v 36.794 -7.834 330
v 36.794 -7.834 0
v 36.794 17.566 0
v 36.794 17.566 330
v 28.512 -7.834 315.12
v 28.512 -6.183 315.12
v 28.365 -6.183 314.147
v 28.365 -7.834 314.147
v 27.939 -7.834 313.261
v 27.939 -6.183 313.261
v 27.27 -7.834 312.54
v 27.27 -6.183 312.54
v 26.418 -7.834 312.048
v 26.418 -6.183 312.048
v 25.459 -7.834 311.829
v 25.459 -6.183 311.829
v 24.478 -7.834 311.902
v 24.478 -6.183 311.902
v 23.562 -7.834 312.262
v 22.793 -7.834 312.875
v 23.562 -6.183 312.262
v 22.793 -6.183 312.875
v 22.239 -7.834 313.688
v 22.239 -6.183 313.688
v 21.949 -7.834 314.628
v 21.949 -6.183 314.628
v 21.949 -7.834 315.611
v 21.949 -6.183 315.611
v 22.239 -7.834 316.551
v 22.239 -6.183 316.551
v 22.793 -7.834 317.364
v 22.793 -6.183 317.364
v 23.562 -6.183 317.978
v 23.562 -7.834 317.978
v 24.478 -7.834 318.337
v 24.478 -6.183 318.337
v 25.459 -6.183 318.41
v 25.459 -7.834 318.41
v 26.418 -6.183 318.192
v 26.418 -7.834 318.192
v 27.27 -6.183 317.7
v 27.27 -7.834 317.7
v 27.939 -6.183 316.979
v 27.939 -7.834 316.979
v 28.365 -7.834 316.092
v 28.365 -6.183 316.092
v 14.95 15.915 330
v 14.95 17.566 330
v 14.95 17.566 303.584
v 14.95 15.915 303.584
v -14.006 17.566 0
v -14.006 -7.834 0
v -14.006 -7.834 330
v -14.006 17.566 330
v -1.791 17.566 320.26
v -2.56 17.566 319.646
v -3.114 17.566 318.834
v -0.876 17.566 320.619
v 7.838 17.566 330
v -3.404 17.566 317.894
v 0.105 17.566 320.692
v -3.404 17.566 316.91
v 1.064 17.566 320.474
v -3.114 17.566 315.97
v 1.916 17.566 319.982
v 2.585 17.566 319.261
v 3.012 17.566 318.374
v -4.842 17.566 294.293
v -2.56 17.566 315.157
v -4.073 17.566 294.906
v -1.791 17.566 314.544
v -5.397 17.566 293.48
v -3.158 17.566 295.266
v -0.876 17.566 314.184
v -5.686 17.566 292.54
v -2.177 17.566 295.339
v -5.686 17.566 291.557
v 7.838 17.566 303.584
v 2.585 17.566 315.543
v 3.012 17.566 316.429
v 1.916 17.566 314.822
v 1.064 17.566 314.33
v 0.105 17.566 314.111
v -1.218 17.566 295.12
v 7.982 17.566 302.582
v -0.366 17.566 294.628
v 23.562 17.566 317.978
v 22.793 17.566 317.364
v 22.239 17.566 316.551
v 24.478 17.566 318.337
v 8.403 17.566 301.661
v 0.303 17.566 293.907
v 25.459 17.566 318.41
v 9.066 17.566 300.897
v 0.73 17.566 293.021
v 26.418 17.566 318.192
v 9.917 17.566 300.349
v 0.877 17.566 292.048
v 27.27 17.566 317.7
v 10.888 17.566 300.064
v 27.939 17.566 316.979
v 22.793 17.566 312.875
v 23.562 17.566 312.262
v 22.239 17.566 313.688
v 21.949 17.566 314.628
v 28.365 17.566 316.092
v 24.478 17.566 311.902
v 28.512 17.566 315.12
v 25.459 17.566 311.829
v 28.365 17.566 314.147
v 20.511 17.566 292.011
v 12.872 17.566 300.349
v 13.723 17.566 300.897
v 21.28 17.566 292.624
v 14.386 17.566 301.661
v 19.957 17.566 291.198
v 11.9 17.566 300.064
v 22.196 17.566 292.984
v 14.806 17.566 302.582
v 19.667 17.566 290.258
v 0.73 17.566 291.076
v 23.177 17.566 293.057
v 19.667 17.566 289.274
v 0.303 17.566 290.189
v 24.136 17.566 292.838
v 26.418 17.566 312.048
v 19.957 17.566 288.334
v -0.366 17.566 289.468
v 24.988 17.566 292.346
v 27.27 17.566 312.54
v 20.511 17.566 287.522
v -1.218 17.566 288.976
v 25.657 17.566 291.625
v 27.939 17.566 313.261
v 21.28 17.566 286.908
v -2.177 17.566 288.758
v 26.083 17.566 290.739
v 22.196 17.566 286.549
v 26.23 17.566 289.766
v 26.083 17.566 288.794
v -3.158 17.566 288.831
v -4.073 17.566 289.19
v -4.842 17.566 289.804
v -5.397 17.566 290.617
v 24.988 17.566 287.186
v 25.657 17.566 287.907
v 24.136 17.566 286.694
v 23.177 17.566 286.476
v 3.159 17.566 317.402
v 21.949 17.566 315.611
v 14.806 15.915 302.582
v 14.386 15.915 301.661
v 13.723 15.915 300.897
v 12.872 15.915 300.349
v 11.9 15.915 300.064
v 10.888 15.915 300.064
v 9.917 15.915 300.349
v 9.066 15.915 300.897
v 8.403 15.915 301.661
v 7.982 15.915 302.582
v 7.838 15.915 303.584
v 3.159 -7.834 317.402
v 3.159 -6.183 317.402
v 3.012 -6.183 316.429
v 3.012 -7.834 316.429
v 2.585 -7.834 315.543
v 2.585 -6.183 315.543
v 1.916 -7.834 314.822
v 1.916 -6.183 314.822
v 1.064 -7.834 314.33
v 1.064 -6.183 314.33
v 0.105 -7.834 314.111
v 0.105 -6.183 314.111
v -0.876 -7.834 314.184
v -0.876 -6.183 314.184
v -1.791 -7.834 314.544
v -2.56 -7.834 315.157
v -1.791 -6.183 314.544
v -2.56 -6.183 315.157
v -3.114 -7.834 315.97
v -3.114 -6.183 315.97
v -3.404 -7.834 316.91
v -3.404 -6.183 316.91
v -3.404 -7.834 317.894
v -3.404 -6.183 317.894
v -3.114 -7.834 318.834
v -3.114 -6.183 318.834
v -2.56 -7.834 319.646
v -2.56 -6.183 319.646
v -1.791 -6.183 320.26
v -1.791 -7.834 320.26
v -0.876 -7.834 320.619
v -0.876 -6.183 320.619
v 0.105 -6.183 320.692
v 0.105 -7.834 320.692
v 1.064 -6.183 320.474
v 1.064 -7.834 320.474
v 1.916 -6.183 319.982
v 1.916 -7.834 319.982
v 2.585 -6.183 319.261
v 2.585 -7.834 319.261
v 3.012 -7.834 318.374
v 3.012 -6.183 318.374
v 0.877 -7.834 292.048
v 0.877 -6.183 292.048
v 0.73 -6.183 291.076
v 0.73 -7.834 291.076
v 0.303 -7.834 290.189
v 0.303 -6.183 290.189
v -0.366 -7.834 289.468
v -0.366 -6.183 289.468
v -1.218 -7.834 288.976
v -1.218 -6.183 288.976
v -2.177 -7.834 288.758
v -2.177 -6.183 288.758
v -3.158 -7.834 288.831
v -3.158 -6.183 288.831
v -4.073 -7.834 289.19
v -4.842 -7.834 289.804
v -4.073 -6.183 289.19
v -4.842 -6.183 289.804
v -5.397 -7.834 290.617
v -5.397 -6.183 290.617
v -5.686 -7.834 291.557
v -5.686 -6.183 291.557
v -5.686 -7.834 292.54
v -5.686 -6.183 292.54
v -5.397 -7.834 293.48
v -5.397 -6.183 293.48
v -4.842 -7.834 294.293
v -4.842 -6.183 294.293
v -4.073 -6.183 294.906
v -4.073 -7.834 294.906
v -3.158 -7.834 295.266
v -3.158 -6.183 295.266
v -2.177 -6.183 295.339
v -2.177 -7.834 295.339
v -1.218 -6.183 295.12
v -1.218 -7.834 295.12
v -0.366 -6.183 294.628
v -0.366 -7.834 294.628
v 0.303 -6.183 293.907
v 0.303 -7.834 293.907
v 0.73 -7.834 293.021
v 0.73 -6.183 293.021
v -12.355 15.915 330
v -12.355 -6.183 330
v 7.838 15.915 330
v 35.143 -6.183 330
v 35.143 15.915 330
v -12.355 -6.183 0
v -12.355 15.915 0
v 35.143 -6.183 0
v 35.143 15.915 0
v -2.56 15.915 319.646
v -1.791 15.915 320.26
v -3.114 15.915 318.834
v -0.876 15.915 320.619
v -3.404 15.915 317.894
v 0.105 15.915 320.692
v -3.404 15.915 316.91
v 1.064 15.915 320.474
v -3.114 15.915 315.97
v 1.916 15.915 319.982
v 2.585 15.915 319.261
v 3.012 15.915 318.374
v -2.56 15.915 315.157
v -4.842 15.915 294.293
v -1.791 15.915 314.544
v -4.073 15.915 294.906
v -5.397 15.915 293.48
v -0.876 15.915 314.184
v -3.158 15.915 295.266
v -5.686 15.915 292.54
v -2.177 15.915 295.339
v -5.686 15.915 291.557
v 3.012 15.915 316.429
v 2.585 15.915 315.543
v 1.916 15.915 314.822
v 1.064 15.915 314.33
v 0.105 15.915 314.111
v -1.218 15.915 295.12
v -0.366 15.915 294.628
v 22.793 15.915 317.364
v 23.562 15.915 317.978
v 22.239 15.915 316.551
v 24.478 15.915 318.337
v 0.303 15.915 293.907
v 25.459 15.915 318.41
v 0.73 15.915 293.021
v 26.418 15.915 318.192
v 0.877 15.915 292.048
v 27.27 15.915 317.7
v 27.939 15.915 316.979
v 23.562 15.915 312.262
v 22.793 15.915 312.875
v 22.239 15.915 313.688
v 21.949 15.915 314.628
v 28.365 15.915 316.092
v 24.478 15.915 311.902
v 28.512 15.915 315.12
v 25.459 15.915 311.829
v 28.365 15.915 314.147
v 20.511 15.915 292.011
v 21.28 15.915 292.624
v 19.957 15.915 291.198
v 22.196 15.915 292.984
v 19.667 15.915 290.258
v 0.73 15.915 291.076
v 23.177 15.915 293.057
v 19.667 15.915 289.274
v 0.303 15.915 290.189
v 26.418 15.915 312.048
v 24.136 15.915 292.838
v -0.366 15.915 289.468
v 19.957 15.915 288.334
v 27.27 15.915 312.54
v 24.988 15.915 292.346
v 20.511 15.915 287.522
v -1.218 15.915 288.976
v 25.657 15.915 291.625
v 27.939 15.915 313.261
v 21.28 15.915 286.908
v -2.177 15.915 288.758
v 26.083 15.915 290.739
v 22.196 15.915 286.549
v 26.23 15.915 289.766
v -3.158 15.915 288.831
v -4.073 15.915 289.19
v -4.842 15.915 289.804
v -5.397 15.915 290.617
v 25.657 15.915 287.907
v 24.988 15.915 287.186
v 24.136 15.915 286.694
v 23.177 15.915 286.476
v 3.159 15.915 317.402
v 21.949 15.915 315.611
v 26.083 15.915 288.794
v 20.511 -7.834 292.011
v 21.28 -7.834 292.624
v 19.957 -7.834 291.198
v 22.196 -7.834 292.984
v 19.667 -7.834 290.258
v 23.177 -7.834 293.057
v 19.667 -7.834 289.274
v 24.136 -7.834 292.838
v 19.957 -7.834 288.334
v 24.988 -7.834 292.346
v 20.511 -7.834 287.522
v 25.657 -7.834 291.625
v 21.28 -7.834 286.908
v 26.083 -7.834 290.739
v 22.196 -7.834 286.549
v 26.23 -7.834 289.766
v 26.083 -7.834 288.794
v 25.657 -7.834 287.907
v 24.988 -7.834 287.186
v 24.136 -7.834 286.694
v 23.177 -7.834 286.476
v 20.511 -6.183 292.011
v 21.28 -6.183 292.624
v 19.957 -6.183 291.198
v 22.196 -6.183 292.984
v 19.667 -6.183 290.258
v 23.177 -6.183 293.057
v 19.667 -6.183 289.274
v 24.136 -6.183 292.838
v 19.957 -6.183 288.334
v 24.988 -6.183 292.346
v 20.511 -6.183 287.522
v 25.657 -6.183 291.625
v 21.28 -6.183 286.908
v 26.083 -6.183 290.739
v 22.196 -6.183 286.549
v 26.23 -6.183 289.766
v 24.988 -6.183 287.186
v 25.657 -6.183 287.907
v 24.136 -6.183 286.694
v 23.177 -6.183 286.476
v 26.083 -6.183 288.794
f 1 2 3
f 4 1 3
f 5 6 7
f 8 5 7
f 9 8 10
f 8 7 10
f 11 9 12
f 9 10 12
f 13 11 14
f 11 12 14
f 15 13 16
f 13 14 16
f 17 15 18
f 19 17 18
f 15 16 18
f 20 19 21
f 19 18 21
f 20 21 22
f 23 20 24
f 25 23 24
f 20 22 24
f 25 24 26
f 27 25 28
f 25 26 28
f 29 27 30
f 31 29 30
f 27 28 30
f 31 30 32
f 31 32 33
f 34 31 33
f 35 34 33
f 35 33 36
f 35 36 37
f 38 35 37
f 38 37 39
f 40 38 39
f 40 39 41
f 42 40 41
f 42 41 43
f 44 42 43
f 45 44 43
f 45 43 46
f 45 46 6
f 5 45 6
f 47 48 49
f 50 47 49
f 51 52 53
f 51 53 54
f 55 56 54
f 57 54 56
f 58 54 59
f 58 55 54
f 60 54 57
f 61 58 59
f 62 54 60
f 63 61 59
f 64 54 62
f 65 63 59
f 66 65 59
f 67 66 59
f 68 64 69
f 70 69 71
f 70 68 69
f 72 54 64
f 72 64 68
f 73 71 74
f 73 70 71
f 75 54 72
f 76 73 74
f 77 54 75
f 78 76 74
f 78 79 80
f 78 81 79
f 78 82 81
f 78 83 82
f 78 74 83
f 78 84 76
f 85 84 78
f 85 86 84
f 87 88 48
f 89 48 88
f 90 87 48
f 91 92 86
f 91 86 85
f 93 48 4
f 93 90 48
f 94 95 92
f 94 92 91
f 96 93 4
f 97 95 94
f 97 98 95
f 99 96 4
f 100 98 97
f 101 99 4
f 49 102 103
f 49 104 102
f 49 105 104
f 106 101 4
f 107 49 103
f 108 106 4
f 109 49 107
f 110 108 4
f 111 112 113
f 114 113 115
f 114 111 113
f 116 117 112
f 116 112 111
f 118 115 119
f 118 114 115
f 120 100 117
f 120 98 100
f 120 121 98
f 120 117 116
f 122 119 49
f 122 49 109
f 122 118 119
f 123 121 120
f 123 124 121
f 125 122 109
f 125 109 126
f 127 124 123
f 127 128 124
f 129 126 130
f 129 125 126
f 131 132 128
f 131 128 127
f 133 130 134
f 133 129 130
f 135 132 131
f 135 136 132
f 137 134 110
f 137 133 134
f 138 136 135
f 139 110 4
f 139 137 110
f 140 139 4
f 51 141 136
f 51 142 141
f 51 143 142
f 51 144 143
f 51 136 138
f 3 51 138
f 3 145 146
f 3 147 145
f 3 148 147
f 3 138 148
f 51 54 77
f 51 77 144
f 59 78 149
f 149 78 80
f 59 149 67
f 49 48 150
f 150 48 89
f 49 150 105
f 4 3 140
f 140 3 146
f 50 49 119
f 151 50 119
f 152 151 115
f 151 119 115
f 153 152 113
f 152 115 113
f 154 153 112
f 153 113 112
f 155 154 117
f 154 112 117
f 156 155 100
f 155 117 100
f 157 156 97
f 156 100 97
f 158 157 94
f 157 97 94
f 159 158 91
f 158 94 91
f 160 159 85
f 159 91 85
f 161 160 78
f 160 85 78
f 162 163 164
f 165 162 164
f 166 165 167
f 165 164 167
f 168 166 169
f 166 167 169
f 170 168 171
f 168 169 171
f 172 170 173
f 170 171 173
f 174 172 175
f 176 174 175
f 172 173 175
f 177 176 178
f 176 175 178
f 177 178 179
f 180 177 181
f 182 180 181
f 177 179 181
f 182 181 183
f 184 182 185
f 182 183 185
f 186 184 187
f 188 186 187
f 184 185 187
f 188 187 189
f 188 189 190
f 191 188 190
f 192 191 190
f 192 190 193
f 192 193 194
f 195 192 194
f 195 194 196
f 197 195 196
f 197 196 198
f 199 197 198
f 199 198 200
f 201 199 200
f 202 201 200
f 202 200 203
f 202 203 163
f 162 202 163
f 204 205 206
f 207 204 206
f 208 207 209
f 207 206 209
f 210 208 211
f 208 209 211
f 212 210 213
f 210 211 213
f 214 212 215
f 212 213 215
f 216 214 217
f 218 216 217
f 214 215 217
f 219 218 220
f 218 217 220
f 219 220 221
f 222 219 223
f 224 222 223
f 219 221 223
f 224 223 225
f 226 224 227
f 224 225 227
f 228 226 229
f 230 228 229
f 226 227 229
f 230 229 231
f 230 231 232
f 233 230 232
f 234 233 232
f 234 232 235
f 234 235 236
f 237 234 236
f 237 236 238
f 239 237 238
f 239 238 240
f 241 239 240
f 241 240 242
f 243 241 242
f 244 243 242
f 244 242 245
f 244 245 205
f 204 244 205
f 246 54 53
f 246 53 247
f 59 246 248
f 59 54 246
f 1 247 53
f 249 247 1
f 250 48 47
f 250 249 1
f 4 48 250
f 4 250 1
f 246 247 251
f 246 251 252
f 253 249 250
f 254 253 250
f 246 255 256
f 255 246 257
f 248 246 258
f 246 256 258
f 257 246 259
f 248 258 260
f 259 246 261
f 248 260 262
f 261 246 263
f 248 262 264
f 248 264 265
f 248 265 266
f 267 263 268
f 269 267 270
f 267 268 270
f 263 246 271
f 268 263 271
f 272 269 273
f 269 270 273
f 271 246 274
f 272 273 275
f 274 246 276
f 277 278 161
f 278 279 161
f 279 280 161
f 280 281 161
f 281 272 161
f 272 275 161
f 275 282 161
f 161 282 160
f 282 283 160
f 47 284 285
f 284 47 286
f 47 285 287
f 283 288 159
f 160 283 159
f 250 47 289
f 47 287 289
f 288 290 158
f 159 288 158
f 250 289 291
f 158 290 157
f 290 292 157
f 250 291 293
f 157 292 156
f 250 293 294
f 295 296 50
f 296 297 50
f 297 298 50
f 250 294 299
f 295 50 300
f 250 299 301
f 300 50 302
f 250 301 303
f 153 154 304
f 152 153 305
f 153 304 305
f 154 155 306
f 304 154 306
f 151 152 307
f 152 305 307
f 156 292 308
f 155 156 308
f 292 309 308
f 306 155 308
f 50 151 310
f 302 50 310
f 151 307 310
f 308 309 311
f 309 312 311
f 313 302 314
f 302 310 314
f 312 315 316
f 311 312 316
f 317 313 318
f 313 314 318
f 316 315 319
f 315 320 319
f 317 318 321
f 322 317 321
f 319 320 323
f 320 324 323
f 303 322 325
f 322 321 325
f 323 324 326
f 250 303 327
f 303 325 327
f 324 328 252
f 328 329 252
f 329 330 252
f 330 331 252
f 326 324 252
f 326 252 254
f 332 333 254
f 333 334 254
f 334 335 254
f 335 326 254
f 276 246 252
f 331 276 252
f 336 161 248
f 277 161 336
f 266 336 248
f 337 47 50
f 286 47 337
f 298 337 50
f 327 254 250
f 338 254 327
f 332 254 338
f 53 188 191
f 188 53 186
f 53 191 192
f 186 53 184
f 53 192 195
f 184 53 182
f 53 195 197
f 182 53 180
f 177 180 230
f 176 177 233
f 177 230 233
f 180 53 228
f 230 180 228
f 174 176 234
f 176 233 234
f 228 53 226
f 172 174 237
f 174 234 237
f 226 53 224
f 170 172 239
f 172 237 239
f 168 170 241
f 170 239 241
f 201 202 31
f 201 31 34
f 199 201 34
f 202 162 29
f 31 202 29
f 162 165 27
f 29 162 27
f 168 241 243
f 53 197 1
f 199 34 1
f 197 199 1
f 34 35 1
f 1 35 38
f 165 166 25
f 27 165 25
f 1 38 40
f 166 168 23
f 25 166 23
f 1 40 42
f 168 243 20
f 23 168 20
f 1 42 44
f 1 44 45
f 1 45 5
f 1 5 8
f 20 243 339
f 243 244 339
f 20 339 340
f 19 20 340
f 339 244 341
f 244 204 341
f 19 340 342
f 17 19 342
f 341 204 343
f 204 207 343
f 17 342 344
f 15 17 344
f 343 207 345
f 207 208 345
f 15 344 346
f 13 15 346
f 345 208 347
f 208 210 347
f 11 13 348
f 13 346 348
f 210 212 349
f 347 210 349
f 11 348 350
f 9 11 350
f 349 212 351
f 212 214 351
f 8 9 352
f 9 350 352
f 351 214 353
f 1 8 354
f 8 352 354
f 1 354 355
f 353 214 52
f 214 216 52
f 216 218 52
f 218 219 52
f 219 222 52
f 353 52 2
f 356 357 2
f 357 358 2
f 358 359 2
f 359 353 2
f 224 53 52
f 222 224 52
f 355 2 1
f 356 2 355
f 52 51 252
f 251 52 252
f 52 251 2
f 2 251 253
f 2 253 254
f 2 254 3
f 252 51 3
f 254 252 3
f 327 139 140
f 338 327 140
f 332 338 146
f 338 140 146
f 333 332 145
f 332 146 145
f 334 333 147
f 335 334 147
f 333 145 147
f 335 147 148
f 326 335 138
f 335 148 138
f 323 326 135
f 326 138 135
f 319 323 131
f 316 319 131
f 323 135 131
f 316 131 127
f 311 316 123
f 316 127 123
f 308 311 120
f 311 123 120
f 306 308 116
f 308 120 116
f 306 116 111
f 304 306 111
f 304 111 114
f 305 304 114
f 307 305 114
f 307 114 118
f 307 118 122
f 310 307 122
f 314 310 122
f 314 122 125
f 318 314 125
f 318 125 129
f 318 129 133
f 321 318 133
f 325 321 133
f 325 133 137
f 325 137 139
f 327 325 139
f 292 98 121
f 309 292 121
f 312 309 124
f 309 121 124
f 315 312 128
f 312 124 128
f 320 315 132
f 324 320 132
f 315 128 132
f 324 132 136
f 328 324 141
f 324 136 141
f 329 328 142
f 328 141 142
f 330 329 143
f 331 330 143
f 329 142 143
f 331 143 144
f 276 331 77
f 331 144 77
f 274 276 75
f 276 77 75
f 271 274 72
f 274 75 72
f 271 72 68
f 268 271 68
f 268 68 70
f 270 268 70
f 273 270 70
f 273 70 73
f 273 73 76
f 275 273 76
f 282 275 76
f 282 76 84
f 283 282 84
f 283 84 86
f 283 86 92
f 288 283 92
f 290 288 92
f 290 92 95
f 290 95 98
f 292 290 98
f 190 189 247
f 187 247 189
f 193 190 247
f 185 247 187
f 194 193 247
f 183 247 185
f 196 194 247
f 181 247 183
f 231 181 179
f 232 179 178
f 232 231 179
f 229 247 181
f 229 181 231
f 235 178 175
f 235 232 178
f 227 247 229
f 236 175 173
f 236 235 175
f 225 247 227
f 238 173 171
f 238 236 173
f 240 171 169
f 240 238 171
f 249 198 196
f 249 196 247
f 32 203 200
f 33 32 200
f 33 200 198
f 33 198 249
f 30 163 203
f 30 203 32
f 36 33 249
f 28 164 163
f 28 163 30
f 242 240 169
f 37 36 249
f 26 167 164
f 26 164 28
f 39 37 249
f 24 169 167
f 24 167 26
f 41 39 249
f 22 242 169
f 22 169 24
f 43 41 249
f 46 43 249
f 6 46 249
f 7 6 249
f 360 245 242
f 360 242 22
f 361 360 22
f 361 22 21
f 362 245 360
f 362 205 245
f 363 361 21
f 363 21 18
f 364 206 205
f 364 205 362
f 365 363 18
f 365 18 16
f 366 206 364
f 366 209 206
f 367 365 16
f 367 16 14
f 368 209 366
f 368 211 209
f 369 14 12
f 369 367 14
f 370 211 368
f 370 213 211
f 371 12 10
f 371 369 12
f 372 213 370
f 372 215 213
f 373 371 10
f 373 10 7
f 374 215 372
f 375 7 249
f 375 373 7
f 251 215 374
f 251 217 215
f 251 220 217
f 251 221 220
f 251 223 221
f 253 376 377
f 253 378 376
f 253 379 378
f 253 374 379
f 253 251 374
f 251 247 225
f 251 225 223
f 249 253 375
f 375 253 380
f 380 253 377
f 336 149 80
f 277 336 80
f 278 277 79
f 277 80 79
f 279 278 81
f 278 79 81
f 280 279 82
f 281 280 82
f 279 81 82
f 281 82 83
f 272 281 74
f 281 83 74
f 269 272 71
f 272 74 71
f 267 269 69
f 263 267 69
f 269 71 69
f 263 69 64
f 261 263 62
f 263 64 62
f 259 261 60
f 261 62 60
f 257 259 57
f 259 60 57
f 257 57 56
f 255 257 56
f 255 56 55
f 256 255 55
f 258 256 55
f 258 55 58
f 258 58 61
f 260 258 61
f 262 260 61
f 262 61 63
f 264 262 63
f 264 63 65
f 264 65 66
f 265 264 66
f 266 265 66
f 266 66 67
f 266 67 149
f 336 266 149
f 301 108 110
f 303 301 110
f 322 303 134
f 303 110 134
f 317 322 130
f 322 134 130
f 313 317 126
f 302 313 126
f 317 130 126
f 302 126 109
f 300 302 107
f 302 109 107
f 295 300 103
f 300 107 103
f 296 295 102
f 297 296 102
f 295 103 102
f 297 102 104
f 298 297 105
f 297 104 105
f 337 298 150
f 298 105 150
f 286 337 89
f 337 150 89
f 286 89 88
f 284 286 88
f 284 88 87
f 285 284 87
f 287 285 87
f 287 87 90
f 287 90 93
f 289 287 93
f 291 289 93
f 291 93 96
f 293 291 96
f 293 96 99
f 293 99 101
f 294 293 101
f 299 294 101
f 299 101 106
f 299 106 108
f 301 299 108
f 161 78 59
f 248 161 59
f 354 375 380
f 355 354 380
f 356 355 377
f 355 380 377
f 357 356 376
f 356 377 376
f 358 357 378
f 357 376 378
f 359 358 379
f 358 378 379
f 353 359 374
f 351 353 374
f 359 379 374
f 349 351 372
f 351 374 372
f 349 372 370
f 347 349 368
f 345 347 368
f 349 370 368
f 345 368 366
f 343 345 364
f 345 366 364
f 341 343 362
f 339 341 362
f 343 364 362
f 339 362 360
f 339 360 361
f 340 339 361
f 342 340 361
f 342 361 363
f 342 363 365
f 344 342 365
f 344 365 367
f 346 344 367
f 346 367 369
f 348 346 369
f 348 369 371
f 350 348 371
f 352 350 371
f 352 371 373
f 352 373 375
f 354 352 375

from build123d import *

# Parameters (mm, degrees)
SKETCH1_W           = 50.8
SKETCH1_H           = 25.4
SKETCH1_W_2         = 47.498
SKETCH1_H_2         = 22.098
BOSS_EXTRUDE1_DEPTH = 330
SKETCH2_R           = 3.300000004
CUT_EXTRUDE2_DEPTH  = 26.4
CUT_EXTRUDE3_DEPTH  = 8.89


with BuildPart() as part:
    # Sketch1 → Boss-Extrude1 (new body)
    with BuildSketch(Plane.XY):
        with Locations((11.394392523, 4.86635514)):
            Rectangle(SKETCH1_W, SKETCH1_H)
        with Locations((11.394392523, 4.86635514)):
            Rectangle(SKETCH1_W_2, SKETCH1_H_2, mode=Mode.SUBTRACT)
    extrude(amount=BOSS_EXTRUDE1_DEPTH)

    # Sketch2 → Cut-Extrude2 (cut, through all)
    with BuildSketch(Plane(origin=(0, 17.56635514, 0), x_dir=(1, 0, 0), z_dir=(0, 1, 0))):
        with Locations((-2.423312001, -292.04835777)):
            Circle(SKETCH2_R)
        with Locations((22.930034754, -289.766295475)):
            Circle(SKETCH2_R)
        with Locations((25.212097048, -315.11964223)):
            Circle(SKETCH2_R)
        with Locations((-0.141249707, -317.401704525)):
            Circle(SKETCH2_R)
    extrude(amount=-CUT_EXTRUDE2_DEPTH, mode=Mode.SUBTRACT)

    # Sketch4 → Cut-Extrude3 (cut)
    with BuildSketch(Plane(origin=(0, 17.56635514, 0), x_dir=(1, 0, 0), z_dir=(0, 1, 0))):
        with BuildLine():
            ThreePointArc((14.950392523, -303.584), (11.394392523, -300.028), (7.838392523, -303.584))
            Line((7.838392523, -303.584), (7.838392523, -330))
            Line((7.838392523, -330), (14.950392523, -330))
            Line((14.950392523, -330), (14.950392523, -303.584))
        make_face()
    extrude(amount=-CUT_EXTRUDE3_DEPTH, mode=Mode.SUBTRACT)


solid = part.part
